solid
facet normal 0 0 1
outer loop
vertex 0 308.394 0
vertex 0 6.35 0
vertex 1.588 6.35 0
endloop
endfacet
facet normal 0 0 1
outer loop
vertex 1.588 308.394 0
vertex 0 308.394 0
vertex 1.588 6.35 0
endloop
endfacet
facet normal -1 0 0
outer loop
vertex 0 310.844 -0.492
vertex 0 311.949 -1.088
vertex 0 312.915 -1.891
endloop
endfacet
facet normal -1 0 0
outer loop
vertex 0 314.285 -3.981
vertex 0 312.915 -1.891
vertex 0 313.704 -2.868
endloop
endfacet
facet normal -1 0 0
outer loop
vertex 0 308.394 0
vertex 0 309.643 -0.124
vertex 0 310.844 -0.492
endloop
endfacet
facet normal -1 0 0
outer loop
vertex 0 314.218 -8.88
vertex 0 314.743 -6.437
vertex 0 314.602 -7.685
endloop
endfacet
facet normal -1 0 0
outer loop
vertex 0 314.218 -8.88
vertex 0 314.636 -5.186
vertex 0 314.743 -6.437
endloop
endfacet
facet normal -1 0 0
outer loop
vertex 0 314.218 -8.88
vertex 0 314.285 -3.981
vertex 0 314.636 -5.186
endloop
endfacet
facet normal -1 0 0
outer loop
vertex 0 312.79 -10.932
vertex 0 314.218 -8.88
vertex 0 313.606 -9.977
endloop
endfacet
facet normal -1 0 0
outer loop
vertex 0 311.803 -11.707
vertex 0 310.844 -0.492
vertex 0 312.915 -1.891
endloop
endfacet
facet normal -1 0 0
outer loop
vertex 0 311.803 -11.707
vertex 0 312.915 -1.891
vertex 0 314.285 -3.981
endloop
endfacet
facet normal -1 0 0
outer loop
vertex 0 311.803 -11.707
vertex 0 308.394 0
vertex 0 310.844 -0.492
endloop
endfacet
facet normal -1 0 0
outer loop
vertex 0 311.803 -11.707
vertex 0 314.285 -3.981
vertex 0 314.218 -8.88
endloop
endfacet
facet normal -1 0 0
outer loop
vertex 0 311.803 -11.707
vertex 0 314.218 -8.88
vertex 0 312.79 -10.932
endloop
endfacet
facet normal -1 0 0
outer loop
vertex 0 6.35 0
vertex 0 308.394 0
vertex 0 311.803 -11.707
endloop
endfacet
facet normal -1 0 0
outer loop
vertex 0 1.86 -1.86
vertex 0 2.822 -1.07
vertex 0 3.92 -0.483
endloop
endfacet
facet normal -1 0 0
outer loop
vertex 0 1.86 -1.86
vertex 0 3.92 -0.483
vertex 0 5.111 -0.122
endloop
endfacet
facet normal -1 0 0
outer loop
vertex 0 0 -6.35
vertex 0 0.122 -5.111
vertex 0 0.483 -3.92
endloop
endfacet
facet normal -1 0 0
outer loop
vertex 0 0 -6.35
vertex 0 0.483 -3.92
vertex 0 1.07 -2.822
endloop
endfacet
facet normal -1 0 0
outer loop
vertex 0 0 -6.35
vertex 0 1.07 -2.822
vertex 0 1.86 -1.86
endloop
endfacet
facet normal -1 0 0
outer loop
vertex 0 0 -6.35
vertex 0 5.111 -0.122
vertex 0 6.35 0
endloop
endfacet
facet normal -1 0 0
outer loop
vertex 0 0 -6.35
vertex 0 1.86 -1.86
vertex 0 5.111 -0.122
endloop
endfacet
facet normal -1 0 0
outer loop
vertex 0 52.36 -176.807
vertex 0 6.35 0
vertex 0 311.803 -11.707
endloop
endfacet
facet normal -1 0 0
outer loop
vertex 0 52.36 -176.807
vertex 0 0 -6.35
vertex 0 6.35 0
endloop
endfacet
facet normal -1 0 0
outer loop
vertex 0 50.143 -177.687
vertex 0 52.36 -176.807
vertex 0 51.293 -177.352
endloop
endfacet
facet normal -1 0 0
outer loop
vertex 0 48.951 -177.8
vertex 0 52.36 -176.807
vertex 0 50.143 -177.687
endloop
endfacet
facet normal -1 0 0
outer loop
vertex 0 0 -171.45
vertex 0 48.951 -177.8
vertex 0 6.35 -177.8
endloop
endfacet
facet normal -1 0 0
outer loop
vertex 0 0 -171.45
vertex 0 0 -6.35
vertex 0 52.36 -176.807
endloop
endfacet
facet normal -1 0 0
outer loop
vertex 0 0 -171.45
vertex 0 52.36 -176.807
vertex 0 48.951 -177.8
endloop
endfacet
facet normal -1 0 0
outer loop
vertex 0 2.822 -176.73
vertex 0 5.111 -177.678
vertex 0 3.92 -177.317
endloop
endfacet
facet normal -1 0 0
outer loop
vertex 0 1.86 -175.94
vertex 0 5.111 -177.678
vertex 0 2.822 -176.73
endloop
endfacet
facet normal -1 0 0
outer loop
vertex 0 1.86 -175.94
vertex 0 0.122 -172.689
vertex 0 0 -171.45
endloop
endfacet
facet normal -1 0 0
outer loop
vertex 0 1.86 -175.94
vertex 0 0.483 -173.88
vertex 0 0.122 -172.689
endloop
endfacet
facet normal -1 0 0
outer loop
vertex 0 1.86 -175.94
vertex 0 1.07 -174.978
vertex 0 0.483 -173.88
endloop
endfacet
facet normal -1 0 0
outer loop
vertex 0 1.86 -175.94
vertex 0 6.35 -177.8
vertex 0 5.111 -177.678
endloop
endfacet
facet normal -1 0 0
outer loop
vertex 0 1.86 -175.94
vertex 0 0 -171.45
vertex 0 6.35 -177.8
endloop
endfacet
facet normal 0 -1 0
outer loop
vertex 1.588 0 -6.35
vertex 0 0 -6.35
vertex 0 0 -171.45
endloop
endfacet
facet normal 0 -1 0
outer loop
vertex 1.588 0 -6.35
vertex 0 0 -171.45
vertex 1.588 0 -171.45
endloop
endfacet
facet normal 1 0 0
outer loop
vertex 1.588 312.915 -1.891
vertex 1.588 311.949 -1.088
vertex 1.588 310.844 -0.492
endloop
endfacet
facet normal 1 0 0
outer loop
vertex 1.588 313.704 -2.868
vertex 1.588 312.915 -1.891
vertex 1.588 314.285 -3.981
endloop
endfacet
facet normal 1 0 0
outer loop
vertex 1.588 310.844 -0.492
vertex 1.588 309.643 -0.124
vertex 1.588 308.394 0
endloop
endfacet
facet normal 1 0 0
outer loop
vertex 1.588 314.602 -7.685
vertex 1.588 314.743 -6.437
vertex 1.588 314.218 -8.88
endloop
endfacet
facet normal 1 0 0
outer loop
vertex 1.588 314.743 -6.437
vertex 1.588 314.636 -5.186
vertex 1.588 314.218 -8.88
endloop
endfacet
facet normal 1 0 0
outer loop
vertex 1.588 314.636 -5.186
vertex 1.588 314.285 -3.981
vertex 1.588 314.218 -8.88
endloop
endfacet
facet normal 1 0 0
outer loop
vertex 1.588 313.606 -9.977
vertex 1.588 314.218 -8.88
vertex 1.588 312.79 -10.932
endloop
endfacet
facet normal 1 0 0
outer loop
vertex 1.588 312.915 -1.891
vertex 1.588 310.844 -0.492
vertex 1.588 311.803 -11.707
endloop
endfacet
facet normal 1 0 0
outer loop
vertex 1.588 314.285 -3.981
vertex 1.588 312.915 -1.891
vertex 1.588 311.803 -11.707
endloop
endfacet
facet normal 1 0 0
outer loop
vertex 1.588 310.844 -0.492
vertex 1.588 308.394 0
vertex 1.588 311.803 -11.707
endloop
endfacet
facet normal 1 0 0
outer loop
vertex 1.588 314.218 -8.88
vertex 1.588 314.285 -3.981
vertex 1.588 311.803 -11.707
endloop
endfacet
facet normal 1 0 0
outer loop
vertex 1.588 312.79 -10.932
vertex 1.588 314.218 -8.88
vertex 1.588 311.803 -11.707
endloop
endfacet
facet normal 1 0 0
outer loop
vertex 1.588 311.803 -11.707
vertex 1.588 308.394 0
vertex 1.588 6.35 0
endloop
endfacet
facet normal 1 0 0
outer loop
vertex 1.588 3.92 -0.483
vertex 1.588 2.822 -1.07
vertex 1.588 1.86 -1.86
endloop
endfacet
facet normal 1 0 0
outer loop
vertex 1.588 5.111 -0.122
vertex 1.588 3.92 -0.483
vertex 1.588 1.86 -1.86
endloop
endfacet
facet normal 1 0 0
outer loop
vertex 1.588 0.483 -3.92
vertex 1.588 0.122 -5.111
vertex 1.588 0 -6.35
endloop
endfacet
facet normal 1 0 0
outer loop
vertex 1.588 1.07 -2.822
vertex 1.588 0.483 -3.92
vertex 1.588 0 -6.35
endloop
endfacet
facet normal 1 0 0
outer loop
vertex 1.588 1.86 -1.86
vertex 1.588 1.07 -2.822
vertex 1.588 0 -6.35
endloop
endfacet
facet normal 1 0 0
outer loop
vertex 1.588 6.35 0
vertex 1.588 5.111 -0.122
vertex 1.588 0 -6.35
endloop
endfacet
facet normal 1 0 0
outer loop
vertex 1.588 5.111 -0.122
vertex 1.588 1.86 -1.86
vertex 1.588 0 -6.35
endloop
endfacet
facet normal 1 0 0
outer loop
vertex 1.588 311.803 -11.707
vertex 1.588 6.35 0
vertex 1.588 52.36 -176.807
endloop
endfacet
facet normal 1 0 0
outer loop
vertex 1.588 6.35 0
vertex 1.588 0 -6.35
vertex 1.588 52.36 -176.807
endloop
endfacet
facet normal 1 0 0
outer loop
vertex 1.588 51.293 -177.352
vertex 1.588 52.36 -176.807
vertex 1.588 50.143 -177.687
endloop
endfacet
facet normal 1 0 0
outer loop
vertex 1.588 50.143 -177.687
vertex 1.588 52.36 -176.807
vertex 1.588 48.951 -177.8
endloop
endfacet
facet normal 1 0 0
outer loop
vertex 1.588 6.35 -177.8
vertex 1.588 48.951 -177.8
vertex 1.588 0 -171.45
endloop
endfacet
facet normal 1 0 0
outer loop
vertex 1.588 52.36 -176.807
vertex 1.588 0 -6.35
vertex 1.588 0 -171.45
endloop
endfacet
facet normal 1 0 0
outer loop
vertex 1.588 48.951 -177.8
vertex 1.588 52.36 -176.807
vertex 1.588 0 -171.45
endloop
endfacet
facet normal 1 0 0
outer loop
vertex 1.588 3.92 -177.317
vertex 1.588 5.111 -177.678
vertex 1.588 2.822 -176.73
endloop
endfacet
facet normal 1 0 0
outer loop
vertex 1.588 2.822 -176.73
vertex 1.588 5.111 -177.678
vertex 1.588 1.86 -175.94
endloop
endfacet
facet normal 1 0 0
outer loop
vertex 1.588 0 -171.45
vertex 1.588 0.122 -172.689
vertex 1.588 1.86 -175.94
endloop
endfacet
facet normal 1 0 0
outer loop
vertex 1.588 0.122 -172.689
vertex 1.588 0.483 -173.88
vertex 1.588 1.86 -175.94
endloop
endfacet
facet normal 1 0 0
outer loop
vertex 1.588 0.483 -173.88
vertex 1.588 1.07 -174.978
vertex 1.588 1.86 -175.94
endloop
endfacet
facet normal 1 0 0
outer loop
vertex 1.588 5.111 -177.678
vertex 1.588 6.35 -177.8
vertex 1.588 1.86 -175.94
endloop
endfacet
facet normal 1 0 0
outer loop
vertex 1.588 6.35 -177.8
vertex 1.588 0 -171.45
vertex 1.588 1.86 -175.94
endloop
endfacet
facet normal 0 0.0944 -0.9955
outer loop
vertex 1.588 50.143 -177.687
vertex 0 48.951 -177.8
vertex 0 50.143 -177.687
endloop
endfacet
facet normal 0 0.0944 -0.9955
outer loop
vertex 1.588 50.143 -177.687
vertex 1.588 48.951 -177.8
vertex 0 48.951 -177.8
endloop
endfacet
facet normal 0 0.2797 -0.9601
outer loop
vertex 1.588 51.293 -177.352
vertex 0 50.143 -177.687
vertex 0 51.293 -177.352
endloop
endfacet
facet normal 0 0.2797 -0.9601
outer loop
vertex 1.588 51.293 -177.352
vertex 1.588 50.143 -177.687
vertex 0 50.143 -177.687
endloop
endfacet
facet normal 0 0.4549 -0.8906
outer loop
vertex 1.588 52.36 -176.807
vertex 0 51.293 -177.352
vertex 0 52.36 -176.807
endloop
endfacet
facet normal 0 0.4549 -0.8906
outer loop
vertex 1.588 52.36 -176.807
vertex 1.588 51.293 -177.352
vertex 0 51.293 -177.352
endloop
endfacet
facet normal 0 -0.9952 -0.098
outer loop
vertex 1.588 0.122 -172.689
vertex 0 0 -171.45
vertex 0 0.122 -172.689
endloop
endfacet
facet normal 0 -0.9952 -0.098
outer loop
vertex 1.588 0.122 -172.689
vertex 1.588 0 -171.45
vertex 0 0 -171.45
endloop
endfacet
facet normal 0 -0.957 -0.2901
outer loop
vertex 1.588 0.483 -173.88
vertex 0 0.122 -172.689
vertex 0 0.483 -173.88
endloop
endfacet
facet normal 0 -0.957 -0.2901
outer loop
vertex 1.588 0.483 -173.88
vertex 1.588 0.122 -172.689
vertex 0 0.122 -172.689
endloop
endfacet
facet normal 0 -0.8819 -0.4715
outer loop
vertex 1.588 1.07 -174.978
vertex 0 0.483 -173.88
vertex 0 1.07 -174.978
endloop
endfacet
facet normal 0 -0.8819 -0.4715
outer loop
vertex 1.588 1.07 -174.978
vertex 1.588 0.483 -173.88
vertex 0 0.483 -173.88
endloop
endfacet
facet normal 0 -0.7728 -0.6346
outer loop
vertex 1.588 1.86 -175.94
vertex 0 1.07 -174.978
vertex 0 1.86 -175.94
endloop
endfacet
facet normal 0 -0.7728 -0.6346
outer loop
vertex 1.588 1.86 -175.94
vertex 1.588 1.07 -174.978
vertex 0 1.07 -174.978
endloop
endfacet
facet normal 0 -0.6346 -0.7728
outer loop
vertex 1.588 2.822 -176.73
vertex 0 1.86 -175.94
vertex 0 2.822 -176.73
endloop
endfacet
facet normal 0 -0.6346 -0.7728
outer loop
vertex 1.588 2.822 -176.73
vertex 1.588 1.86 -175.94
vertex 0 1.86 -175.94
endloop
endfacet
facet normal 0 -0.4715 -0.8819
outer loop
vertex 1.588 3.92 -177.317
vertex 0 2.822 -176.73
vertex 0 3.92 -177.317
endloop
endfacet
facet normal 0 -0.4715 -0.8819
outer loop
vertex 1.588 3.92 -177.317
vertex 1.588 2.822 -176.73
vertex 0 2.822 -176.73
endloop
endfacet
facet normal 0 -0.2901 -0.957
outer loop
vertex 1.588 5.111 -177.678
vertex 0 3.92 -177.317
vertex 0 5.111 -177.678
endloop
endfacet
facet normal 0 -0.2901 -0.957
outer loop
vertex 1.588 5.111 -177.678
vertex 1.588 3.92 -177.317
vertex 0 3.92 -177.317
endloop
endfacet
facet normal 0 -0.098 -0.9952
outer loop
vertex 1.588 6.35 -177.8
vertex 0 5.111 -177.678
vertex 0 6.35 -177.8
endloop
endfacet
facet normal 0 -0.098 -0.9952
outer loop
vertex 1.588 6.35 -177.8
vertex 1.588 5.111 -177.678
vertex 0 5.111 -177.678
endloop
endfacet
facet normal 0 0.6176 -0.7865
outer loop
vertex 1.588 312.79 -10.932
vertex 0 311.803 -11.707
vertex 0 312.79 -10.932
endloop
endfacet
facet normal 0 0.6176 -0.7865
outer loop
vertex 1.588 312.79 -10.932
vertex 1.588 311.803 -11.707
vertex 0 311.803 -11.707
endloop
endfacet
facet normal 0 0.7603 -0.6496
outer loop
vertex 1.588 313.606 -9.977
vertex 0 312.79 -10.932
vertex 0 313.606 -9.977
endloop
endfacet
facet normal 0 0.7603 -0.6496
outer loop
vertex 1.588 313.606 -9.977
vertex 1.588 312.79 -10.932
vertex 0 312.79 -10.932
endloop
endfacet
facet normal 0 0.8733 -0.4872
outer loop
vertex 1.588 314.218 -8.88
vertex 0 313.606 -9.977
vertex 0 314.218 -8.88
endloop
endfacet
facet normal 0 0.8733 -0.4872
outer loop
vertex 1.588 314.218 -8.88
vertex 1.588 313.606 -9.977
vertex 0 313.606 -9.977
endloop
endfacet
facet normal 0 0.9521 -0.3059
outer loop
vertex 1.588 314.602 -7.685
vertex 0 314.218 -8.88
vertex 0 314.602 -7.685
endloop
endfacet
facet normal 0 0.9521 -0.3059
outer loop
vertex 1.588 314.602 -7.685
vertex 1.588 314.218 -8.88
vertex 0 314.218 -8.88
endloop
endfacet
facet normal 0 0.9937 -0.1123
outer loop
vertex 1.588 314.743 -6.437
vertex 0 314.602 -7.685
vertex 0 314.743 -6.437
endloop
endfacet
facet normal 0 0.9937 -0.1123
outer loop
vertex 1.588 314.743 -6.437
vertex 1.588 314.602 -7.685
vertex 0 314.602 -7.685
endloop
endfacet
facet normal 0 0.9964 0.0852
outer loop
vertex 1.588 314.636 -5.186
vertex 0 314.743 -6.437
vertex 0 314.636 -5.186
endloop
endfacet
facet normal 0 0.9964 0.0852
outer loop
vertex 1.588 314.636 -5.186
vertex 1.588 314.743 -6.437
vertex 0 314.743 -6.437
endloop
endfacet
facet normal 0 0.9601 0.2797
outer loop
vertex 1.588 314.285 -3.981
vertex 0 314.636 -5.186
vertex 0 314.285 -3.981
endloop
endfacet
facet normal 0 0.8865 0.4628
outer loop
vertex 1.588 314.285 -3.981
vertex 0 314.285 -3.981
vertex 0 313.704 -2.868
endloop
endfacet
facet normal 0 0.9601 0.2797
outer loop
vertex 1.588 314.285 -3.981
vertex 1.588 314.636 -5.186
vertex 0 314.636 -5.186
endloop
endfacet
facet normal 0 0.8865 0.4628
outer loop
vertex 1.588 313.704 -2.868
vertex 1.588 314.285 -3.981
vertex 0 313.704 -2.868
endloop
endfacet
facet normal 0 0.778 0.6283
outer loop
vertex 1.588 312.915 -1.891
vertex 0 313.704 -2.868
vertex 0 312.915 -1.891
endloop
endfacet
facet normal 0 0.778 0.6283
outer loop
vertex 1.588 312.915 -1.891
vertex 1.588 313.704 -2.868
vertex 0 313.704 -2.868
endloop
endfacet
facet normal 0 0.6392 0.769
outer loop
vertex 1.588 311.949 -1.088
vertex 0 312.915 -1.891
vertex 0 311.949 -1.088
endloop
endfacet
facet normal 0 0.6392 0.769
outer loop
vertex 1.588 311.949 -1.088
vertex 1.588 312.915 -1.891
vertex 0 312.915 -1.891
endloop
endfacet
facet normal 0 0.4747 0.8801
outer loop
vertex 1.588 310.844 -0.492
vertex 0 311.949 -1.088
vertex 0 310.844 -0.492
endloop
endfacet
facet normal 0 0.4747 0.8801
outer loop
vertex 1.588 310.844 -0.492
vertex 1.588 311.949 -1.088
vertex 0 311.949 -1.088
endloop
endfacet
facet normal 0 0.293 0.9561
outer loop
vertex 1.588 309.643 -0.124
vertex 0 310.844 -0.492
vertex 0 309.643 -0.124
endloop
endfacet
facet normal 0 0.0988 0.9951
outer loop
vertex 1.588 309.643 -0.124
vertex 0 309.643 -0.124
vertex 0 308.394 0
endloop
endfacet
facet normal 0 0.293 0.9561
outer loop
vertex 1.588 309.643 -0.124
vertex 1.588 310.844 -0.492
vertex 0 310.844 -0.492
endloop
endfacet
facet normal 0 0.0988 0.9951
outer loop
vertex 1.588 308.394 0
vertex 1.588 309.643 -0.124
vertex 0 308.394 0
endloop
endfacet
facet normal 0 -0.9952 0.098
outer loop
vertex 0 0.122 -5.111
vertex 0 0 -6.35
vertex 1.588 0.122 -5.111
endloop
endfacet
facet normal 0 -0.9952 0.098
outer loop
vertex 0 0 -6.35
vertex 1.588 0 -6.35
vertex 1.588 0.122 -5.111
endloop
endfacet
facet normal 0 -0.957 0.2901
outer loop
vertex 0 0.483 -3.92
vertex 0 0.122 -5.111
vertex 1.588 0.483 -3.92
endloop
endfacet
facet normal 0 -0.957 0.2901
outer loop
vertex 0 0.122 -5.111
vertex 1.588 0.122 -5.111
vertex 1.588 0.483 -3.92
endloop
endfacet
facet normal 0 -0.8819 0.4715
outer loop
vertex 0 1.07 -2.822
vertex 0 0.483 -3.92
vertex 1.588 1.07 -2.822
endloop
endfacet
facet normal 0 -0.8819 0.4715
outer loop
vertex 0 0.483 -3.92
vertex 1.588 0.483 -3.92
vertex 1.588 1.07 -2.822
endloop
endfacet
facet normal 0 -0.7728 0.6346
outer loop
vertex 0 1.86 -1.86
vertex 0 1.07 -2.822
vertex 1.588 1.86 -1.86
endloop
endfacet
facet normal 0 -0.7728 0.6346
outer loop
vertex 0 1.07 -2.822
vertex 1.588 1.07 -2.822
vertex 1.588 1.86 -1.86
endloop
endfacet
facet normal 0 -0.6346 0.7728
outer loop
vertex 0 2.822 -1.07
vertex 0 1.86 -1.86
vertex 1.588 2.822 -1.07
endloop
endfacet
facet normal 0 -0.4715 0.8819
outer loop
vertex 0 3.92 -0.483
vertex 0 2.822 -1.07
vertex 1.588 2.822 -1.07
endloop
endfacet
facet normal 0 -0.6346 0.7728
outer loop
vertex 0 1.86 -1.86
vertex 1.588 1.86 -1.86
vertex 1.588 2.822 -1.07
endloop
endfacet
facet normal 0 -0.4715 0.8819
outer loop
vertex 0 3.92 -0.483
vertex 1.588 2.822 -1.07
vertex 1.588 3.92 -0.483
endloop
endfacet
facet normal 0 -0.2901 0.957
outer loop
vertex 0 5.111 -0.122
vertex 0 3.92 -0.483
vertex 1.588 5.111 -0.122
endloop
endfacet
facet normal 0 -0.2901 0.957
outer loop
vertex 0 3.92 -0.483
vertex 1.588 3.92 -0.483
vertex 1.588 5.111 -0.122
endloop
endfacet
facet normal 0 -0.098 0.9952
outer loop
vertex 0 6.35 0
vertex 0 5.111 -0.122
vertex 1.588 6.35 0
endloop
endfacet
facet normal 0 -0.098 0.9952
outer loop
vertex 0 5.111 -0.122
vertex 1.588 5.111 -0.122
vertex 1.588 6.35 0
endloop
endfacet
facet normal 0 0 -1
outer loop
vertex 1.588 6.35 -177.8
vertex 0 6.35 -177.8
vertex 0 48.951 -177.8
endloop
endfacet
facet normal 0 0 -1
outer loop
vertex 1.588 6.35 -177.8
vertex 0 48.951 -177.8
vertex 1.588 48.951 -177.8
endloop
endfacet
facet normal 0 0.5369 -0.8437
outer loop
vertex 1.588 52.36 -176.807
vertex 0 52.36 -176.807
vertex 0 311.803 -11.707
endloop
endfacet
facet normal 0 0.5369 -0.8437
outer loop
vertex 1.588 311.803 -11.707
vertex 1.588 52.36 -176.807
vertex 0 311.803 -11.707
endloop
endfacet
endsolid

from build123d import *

# Parameters (mm, degrees)
SKETCH1_W           = 1.5875
SKETCH1_H           = 177.8
BOSS_EXTRUDE1_DEPTH = 330.2
CUT_EXTRUDE1_DEPTH  = 1.5875
FILLET1_R           = 6.35


with BuildPart() as part:
    # Sketch1 → Boss-Extrude1 (new body)
    with BuildSketch(Plane(origin=(0, 0, 0), x_dir=(1, 0, 0), z_dir=(0, 1, 0))):
        with Locations((0.79375, 88.9)):
            Rectangle(SKETCH1_W, SKETCH1_H)
    extrude(amount=BOSS_EXTRUDE1_DEPTH)

    # Sketch2 → Cut-Extrude1 (cut)
    with BuildSketch(Plane.ZY):
        Polygon((-177.8, 50.8), (0, 330.2), (-177.8, 330.2), align=None)
    extrude(amount=-CUT_EXTRUDE1_DEPTH, mode=Mode.SUBTRACT)

    # Fillet1
    fillet1_edges = [part.edges().sort_by_distance(p)[0] for p in [
        (0.79375, 50.8, -177.8),
        (0.79375, 330.2, 0),
        (0.79375, 0, -177.8),
        (0.79375, 0, 0),
    ]]
    fillet(fillet1_edges, radius=FILLET1_R)


solid = part.part
